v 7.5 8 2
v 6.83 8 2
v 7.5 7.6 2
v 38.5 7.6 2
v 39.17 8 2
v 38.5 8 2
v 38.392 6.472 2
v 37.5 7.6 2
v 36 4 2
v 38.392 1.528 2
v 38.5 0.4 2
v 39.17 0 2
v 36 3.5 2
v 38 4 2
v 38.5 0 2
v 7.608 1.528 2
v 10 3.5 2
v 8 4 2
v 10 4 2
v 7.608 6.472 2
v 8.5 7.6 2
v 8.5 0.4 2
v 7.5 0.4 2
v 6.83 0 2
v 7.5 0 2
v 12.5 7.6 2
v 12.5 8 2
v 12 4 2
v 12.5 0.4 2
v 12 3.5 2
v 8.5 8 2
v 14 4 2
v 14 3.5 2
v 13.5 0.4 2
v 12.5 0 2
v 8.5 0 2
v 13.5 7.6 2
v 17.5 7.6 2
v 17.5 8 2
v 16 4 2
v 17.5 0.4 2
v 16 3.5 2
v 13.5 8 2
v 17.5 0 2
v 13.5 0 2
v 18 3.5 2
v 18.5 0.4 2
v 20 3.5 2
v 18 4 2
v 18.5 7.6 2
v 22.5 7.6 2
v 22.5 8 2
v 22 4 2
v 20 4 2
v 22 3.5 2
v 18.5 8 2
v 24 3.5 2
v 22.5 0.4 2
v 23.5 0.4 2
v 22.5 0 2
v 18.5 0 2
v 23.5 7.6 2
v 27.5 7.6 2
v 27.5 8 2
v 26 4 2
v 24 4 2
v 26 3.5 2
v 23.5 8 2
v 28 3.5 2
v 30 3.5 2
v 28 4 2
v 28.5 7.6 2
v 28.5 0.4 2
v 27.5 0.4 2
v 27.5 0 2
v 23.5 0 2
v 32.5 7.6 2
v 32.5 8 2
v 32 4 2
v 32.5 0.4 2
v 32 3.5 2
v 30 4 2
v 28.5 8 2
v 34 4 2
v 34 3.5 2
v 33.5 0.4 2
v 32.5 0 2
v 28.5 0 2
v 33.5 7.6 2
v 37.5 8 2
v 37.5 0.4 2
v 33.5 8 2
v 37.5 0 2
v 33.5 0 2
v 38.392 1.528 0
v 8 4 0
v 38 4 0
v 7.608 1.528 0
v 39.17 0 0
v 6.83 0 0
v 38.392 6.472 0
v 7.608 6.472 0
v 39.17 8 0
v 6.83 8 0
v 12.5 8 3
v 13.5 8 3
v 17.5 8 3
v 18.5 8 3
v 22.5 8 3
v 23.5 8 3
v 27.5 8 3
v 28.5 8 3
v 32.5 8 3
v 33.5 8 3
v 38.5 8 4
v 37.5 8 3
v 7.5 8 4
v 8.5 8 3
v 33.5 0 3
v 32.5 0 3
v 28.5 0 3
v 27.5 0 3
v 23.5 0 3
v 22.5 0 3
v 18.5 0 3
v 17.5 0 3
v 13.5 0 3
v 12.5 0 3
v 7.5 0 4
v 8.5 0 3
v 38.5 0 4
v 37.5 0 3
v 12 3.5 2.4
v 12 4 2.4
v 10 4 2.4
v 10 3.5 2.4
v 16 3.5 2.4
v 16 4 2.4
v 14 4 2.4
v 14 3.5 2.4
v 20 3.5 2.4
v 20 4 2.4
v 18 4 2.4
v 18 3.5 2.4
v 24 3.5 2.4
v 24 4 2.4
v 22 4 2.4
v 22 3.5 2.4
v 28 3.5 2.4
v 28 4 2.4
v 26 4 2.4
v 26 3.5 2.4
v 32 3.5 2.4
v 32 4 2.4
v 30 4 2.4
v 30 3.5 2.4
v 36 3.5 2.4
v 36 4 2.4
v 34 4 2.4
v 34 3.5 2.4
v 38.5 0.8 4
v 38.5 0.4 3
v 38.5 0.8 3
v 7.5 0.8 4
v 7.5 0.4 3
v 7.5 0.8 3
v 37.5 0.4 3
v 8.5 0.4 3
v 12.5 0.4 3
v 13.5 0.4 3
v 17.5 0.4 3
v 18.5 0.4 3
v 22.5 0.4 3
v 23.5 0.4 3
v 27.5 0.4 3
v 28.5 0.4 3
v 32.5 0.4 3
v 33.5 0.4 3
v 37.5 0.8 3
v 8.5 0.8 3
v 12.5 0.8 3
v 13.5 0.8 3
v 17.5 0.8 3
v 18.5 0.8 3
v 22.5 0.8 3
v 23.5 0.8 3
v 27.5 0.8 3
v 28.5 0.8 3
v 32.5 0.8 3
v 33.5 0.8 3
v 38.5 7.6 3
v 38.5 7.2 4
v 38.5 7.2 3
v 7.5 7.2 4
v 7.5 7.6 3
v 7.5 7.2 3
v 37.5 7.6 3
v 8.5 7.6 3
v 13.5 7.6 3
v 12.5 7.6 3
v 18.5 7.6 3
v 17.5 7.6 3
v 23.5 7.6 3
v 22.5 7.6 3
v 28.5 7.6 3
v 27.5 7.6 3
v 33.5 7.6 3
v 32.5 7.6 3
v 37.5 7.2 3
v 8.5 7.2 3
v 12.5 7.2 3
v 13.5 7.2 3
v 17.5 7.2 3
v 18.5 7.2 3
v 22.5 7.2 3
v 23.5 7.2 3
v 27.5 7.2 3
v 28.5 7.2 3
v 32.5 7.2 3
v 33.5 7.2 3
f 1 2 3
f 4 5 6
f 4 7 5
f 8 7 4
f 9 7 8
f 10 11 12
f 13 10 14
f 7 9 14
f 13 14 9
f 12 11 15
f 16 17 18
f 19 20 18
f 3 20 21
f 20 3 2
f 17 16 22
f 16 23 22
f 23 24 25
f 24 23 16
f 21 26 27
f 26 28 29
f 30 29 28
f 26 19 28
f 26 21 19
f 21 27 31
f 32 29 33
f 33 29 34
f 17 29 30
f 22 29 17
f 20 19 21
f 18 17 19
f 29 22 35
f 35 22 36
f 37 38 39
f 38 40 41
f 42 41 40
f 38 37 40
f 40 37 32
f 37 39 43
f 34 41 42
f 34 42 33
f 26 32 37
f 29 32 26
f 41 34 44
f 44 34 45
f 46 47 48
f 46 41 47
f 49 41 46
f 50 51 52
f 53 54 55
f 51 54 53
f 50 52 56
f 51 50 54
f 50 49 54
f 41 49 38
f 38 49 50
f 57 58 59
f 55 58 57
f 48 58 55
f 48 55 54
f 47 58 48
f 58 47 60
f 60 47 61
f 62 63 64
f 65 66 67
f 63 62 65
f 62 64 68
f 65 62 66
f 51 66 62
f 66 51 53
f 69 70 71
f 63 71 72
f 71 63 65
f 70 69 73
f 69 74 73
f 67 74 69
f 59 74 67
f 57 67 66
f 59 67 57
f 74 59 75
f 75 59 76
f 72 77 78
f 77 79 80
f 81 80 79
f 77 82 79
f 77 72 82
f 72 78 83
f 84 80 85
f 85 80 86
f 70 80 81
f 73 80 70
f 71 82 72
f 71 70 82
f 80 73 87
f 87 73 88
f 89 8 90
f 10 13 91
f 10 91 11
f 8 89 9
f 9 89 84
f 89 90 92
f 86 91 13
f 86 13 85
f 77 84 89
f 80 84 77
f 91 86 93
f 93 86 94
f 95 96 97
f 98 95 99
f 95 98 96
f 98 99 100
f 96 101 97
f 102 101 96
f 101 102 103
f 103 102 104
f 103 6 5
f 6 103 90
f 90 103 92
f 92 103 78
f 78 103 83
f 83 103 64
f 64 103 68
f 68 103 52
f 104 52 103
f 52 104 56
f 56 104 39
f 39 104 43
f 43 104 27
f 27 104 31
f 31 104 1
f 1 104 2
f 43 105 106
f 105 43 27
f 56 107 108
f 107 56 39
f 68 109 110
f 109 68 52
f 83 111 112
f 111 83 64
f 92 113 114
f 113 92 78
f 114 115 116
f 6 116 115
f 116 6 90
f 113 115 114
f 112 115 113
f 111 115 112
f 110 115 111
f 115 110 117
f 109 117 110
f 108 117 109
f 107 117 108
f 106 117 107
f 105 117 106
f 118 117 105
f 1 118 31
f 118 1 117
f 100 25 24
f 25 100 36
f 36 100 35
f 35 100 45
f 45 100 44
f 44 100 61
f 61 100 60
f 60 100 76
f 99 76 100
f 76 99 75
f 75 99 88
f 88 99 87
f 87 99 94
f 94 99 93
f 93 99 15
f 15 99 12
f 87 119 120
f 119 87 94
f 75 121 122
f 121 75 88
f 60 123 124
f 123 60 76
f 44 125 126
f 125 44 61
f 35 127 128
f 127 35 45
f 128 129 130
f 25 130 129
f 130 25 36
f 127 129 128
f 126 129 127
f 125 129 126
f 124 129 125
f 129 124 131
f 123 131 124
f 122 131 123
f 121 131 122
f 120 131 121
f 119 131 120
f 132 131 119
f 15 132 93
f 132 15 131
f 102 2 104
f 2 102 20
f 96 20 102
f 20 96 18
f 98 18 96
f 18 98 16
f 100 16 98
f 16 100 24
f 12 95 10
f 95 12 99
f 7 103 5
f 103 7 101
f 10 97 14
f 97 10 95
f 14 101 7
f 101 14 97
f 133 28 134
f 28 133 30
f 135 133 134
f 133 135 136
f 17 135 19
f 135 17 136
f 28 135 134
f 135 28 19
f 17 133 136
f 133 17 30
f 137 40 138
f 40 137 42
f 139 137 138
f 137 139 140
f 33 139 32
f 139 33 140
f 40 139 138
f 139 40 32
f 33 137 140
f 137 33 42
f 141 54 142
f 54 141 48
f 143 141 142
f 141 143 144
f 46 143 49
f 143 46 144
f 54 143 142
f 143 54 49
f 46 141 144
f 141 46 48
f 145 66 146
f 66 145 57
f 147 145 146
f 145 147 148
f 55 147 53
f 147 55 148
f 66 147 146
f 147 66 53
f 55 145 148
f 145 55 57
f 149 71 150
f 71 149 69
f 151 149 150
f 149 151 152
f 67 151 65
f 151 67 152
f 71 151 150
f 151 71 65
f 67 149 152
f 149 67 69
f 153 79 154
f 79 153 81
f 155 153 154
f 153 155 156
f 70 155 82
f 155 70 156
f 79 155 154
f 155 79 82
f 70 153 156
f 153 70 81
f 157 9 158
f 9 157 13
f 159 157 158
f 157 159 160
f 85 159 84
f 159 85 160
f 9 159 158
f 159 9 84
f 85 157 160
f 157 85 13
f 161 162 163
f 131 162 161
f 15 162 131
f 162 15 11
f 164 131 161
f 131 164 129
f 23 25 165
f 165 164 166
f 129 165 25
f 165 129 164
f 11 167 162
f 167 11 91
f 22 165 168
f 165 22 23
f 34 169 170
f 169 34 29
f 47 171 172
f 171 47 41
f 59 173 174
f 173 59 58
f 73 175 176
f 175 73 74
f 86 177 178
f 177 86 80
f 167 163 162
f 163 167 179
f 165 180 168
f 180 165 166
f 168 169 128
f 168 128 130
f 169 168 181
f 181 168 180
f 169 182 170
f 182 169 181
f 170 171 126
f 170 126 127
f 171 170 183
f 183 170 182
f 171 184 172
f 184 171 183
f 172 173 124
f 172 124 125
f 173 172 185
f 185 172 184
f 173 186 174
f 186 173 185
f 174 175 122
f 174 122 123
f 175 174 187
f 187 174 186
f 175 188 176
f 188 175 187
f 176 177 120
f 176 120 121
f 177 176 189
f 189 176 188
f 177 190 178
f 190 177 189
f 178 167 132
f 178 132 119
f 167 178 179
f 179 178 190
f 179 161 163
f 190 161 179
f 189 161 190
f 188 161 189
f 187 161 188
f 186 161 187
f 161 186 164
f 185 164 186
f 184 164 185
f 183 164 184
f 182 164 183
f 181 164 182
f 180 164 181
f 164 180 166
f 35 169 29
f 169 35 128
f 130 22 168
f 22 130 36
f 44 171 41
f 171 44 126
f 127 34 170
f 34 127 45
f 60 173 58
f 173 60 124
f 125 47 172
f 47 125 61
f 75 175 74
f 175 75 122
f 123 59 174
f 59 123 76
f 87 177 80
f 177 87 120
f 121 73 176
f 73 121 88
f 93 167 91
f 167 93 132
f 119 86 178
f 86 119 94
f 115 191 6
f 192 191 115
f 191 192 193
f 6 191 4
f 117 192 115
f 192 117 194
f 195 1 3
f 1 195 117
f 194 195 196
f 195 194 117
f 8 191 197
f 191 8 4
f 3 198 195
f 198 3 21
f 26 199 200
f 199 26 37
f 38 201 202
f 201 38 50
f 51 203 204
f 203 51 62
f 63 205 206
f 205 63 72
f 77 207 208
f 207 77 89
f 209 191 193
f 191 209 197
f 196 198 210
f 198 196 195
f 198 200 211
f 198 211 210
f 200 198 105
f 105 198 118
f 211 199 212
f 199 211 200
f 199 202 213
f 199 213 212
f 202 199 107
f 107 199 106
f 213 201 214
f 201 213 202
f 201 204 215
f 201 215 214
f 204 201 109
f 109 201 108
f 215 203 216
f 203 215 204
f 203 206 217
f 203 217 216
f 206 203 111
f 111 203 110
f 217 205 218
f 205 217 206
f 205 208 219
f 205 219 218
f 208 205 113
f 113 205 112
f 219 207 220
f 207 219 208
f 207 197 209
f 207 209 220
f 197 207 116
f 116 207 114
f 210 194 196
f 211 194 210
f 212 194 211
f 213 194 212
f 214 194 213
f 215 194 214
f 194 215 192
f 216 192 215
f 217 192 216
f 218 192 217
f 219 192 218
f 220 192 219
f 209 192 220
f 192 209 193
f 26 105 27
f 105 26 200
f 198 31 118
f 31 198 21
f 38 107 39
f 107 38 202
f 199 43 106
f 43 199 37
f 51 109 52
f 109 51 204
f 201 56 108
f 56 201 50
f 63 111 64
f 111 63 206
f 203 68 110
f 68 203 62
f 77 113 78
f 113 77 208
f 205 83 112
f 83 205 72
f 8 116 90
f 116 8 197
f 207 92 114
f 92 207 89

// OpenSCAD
difference(){
cube([46,8,2]);
color("red") translate([0,4,-.5]) cylinder(r=8,h=3,$fn=20);
color("red") translate([46,4,-.5]) cylinder(r=8,h=3,$fn=20);
}
translate([8,0,2]) {
  for(x=[2:4:26]){
    translate([x,3.5]) cube([2,0.5,0.4]);
  }
}
translate([7,0,2]) rail();
translate([7,8,2]) mirror([0,1,0]) rail();
module rail(){
  difference(){
    union(){
      translate([0.5,0,0]) cube([31,0.4,2]);
      translate([0.5,0,1]) cube([31,0.8,1]);
    }
    for(x=[1.5:5:30])
      translate([x,-.1]) cube([4,1,1]);
  }
}
